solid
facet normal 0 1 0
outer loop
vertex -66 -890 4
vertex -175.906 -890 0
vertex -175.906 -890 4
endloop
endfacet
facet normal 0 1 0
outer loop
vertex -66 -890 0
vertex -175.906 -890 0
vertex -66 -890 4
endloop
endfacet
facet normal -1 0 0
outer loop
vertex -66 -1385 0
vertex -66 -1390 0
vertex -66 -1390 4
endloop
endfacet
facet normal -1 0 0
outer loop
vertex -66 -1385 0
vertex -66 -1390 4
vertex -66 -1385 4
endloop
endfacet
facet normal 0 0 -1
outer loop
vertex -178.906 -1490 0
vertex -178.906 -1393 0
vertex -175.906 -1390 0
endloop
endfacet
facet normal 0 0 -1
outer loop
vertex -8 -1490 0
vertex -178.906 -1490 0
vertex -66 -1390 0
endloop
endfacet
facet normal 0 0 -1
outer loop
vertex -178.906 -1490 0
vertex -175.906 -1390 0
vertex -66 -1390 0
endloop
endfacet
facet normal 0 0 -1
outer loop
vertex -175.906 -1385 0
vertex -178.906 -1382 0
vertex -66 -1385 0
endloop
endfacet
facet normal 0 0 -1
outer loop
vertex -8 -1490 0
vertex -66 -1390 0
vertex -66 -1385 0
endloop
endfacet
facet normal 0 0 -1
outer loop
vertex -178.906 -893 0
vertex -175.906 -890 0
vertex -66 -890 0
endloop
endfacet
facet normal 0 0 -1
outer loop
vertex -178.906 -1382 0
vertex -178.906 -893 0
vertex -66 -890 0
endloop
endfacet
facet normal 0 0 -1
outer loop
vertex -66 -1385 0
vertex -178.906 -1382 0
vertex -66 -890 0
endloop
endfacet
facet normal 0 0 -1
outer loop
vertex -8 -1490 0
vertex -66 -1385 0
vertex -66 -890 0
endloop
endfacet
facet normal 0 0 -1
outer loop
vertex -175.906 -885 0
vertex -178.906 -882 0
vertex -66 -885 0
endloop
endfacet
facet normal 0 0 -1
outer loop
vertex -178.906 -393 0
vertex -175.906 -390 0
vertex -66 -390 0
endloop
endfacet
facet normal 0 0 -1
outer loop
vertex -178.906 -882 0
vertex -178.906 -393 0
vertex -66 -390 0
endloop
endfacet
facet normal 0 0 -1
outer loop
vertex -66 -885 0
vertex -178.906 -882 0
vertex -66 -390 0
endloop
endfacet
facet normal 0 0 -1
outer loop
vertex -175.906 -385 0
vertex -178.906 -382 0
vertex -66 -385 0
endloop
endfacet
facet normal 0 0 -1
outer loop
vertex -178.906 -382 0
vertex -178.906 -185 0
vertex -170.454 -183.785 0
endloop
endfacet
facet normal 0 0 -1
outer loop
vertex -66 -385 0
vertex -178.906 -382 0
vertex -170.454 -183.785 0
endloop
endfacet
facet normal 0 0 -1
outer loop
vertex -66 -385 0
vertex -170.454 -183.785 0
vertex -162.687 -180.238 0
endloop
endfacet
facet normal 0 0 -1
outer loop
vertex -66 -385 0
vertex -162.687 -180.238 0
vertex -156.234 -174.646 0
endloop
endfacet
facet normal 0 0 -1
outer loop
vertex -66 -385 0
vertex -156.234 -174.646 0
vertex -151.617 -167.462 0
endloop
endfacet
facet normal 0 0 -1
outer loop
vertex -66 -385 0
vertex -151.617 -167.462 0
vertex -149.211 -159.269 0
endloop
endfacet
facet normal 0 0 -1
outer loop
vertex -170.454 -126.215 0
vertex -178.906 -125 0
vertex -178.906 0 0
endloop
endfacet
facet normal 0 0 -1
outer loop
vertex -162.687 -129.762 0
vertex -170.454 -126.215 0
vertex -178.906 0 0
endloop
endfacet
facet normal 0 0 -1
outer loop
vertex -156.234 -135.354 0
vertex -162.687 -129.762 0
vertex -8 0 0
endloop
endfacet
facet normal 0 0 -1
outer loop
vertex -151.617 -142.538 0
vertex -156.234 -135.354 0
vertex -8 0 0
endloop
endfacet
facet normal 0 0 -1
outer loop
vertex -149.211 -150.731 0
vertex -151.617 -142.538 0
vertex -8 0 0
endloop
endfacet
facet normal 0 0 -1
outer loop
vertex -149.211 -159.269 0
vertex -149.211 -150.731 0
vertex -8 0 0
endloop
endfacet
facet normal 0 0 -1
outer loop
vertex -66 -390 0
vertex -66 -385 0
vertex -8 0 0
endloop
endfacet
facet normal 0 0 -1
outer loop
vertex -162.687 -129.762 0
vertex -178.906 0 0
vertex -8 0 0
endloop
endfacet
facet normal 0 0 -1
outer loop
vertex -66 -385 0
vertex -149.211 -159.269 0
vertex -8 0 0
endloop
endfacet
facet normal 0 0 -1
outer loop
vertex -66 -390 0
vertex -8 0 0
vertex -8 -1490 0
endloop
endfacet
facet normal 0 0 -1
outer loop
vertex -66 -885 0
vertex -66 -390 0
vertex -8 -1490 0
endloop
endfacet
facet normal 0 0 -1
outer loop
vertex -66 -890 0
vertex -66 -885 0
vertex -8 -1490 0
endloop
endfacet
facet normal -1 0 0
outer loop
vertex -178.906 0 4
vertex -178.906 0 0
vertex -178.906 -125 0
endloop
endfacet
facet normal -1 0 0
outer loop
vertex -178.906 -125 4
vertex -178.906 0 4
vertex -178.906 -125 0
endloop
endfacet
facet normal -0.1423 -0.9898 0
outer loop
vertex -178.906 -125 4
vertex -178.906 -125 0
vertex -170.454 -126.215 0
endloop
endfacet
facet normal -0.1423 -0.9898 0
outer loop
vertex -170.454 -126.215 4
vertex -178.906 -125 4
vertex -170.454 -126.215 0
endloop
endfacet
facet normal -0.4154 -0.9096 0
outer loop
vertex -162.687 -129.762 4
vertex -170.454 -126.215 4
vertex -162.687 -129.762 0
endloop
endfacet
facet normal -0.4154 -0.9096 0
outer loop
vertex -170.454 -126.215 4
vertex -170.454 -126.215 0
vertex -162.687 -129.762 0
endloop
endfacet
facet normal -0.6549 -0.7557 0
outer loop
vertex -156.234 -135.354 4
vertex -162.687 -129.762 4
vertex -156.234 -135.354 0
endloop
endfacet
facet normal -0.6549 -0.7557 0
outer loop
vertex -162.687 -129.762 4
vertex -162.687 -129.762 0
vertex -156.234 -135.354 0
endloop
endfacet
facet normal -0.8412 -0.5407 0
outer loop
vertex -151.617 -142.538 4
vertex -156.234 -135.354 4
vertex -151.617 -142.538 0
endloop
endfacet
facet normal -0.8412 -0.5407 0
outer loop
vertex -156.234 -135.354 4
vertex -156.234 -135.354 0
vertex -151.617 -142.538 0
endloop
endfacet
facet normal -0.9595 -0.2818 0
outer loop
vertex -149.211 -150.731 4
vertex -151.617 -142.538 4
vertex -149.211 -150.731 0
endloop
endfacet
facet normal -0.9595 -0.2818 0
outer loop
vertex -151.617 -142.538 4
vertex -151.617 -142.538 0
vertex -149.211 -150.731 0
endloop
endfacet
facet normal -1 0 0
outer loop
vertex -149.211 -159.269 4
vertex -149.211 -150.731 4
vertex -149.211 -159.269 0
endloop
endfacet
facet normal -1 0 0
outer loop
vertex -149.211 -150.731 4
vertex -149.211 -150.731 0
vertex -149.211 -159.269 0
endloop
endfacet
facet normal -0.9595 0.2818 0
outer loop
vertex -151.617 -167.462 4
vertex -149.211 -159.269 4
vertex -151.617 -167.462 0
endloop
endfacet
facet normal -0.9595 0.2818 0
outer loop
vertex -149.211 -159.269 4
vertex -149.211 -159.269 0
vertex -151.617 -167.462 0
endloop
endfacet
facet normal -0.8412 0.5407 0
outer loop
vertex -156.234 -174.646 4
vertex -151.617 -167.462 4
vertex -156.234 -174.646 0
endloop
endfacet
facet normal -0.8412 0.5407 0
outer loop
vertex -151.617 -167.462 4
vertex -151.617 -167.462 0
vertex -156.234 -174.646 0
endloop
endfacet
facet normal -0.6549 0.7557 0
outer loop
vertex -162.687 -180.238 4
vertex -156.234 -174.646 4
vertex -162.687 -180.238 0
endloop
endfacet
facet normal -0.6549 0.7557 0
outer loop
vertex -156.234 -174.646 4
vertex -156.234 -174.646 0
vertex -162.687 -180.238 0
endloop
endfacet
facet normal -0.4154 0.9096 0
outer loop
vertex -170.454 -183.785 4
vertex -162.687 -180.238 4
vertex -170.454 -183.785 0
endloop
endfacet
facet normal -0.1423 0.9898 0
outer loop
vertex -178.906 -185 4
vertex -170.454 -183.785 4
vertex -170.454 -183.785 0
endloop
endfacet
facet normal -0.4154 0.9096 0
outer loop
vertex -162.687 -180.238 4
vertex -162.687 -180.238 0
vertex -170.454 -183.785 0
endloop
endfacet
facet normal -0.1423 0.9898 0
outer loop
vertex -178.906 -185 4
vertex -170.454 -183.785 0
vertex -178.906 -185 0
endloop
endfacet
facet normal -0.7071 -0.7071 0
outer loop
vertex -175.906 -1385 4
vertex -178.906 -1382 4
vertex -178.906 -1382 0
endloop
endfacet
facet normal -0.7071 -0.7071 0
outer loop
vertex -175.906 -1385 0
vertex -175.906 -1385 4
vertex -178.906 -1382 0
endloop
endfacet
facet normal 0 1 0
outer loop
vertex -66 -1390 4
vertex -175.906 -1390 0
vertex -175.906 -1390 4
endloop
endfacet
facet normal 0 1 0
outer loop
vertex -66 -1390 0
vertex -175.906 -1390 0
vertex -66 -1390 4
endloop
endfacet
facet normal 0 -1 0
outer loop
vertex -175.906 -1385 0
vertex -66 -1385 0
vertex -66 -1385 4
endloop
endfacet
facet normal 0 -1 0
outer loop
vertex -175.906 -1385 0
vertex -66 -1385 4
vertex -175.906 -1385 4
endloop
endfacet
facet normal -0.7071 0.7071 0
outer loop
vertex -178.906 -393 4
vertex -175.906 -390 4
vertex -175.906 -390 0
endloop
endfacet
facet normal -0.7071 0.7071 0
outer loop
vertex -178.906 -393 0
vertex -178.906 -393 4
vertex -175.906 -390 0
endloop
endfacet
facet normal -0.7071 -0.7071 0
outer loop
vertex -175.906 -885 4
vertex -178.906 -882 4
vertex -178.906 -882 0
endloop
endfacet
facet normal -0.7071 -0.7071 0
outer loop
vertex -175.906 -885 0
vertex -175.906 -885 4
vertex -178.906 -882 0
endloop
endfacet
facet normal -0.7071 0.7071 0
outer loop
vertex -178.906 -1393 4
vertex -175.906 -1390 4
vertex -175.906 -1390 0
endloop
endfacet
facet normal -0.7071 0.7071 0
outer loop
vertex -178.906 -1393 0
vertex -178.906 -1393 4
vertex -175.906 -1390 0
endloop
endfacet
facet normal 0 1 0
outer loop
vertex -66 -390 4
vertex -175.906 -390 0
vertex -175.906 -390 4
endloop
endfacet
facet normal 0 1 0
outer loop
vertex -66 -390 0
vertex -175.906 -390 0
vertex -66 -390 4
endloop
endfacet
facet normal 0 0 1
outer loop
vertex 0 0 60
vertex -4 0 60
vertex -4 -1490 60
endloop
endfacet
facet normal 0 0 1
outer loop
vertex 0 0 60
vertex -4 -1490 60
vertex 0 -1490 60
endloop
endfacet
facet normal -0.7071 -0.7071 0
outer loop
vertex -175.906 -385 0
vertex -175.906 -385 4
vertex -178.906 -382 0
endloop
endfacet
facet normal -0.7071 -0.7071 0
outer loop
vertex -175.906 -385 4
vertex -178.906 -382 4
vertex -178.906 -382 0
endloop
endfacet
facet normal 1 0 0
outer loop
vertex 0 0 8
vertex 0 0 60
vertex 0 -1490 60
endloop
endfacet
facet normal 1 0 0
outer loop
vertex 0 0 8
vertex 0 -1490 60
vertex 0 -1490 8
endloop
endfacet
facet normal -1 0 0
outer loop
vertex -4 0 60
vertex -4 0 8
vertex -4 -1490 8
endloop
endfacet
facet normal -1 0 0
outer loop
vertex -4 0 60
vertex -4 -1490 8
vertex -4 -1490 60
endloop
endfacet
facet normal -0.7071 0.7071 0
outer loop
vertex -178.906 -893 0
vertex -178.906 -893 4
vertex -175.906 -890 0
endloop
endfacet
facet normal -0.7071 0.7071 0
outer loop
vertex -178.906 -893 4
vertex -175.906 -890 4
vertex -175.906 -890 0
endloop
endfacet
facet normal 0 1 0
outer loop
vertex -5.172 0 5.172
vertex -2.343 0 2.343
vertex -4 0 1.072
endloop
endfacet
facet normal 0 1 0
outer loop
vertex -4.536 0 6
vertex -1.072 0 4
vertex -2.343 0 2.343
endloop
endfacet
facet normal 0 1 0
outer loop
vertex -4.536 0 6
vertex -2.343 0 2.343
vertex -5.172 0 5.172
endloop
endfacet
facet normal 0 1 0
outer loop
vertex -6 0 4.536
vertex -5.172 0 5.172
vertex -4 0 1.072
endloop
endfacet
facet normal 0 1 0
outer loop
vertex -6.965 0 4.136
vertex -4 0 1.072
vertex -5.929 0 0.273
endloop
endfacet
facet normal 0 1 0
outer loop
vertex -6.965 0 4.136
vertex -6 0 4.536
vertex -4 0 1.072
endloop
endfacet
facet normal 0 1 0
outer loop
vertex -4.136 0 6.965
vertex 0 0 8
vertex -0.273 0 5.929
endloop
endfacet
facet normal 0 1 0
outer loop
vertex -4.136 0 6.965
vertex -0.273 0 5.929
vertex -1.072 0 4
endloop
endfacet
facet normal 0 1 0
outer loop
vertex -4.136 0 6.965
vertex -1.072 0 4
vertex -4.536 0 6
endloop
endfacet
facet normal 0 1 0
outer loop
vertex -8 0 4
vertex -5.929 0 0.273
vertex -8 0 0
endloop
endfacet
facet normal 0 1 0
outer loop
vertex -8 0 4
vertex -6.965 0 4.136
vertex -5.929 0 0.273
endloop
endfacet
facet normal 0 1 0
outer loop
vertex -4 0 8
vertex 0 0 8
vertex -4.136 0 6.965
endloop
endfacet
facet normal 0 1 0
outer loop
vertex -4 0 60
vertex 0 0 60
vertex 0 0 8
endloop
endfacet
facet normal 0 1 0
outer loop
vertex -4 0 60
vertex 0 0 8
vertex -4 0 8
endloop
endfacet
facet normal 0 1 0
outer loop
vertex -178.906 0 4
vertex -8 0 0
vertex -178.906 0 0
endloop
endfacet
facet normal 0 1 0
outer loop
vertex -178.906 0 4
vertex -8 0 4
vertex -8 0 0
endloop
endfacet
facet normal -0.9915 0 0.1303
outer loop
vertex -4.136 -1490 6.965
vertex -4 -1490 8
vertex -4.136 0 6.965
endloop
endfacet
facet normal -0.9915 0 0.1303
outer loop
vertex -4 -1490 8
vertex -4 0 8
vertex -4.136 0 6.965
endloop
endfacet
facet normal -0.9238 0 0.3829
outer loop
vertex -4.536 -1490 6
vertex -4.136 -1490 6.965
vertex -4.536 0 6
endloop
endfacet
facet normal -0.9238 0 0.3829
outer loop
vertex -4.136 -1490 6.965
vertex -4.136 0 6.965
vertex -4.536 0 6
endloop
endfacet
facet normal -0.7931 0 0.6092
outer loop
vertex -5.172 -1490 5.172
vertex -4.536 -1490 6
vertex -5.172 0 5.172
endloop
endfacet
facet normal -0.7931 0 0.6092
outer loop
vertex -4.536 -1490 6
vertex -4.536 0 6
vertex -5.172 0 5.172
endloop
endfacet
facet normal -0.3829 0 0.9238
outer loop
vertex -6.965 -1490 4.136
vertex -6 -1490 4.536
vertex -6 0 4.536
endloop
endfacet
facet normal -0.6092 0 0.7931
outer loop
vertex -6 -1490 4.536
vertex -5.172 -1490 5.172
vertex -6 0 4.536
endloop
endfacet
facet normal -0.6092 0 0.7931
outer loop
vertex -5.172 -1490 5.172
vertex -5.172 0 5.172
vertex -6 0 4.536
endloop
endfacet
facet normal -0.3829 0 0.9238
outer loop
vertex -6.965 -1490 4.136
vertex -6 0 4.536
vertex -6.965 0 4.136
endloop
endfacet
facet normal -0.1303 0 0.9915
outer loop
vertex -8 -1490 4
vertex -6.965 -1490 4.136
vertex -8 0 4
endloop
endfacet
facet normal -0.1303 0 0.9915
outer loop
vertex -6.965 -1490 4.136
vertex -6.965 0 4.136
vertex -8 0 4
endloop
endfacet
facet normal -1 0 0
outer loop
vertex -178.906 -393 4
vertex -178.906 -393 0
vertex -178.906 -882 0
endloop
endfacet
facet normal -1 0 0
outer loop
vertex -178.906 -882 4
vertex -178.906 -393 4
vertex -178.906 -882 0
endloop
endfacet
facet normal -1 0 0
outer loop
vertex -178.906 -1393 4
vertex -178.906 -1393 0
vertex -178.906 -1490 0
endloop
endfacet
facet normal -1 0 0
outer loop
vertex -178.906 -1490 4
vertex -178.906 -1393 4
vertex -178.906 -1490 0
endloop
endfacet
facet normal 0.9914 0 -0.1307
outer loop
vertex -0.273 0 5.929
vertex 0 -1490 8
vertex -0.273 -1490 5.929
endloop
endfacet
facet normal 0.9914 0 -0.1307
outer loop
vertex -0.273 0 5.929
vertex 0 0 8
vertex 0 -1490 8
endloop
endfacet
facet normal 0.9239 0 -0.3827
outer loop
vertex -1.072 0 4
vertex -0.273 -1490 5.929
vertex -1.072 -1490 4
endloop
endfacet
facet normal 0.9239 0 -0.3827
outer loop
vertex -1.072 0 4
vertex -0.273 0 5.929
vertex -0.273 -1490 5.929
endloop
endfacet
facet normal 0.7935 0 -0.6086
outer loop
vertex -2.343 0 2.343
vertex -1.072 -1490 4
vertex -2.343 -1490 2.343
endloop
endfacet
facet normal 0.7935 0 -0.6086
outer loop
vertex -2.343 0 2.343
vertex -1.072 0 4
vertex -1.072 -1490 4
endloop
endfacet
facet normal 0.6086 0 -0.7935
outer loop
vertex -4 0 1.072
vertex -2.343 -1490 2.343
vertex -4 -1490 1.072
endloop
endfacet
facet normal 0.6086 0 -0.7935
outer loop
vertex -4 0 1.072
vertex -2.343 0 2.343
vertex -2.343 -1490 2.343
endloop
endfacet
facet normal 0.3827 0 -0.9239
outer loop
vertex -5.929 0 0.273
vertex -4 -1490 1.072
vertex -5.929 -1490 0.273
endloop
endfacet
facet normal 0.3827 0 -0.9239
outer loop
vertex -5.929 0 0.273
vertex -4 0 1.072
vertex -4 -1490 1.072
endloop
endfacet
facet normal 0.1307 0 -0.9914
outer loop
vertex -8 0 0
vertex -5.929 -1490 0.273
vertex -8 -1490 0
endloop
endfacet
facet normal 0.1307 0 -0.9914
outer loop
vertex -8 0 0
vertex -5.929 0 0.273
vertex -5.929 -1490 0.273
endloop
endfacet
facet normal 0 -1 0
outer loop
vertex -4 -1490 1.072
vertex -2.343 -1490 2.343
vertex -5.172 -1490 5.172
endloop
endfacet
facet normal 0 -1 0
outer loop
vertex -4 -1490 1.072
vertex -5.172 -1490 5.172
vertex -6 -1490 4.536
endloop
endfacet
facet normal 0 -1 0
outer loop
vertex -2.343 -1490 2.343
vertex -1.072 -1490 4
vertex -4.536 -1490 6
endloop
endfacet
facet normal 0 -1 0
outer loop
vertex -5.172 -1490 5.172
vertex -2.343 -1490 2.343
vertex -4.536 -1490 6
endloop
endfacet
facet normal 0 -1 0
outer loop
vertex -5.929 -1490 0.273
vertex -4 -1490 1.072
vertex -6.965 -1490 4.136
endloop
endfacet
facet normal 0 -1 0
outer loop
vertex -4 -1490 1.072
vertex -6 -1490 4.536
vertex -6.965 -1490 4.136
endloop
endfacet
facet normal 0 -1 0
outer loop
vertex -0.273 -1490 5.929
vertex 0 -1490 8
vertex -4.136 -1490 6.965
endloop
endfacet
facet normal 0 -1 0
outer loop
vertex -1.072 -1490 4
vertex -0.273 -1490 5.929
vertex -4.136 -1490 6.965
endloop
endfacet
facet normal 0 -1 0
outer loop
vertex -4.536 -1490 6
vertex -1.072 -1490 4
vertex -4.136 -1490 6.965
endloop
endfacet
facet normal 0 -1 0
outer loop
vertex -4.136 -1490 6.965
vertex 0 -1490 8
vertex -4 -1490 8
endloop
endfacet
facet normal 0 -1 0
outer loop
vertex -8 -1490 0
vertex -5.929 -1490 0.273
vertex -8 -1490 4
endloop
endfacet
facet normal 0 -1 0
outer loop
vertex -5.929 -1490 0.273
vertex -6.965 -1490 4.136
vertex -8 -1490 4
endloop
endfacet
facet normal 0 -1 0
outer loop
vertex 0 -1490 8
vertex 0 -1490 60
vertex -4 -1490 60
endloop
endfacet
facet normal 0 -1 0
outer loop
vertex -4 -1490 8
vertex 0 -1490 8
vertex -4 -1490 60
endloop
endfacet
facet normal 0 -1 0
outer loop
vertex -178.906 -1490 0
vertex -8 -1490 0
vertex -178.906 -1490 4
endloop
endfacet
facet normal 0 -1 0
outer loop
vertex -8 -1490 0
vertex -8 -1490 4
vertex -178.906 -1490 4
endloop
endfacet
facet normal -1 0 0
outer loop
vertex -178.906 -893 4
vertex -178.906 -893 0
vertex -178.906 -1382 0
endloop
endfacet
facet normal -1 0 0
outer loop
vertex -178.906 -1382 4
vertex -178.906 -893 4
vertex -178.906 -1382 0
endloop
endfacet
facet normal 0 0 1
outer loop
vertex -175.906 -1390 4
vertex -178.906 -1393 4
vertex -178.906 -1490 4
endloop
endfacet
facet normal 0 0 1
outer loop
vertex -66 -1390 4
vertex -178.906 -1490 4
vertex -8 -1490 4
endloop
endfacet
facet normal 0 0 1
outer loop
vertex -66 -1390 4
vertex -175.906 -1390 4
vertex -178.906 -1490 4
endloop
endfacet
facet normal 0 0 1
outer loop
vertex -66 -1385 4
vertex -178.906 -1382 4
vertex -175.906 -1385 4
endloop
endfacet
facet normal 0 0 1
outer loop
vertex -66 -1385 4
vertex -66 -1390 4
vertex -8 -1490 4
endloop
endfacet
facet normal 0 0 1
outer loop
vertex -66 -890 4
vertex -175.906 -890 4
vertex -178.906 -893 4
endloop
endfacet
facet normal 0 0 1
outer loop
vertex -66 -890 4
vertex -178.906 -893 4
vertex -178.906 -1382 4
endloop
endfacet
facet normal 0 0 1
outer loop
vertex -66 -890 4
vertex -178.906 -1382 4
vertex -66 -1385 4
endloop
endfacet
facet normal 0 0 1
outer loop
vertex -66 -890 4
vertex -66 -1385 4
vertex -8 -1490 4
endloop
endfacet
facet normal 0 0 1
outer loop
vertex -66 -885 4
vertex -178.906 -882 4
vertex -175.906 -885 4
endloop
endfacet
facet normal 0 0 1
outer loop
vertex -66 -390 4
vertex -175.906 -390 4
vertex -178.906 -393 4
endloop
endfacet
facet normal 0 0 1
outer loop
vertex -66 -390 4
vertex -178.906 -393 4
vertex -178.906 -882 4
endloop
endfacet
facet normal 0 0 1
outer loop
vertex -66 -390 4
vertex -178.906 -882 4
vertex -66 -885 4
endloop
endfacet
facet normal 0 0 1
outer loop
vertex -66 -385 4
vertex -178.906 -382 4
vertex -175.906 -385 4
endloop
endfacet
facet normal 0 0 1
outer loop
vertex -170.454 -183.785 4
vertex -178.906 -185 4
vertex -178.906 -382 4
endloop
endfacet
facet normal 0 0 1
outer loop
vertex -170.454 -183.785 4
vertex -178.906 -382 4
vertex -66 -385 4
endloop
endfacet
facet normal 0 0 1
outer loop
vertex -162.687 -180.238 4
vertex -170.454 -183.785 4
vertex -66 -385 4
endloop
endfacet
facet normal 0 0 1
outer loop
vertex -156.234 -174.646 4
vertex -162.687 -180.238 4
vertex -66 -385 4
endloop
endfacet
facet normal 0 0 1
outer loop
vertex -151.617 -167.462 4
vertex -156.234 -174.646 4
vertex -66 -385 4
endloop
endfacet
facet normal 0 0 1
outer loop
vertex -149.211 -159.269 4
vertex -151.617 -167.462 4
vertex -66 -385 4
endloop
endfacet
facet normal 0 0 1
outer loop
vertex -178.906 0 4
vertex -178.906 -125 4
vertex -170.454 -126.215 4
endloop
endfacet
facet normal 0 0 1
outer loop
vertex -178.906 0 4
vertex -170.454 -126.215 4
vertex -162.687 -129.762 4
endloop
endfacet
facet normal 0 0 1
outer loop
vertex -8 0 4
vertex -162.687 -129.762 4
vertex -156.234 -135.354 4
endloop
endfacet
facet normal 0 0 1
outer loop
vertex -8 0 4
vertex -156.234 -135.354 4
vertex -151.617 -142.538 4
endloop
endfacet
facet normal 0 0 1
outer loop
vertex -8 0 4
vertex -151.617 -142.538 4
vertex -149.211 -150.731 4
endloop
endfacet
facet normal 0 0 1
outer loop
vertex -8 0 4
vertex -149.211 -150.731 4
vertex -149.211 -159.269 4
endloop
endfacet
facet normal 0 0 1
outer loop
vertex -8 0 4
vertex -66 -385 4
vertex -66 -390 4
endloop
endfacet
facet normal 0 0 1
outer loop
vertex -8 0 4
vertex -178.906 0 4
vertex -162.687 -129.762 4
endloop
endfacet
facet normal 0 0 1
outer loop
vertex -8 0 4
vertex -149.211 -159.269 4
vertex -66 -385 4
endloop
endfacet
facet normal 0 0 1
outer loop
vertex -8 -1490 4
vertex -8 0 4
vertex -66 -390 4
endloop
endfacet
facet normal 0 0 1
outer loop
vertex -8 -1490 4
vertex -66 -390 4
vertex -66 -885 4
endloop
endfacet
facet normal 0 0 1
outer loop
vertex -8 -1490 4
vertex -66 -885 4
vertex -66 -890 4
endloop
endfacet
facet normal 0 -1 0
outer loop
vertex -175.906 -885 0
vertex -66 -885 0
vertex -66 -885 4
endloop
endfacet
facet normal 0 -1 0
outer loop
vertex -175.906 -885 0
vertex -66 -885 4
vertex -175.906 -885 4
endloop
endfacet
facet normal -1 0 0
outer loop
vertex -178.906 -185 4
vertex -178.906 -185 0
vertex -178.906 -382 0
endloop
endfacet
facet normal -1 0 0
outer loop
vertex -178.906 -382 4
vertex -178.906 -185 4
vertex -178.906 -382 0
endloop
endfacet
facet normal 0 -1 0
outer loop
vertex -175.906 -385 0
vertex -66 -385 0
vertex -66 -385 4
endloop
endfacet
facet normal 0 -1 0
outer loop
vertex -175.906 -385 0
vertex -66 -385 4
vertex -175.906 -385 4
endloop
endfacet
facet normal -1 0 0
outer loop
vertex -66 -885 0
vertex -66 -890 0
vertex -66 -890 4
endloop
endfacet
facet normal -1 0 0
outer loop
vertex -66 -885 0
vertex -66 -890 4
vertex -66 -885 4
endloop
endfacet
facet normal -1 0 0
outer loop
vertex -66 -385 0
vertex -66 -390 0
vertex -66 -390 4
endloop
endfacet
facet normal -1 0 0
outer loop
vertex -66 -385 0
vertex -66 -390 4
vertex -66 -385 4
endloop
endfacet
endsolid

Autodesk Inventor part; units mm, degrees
ref_plane "YZ Plane" through (0, 0, 0) normal (1, 0, 0) x (0, 1, 0)
ref_plane "XZ Plane" through (0, 0, 0) normal (0, 1, 0) x (-1, 0, 0)
ref_plane "XY Plane" through (0, 0, 0) normal (0, 0, 1) x (1, 0, 0)
sketch "Sketch1" plane through (0, 0, 0) normal (0, 0, 1) x (1, 0, 0)
  line L0 (0, 0) -> (-178.9061, 0)
  line L1 (-178.9061, 0) -> (-178.9061, -1490)
  line L2 (-178.9061, -1490) -> (0, -1490)
  line L3 (0, -1490) -> (0, 0)
  line L4 (-178.9061, -1390) -> (-66, -1390)
  line L5 (-66, -1390) -> (-66, -1385)
  line L6 (-66, -1385) -> (-178.9061, -1385)
  line L7 (-178.9061, -1385) -> (-178.9061, -1390)
  line L8 (-178.9061, -890) -> (-66, -890)
  line L9 (-66, -890) -> (-66, -885)
  line L10 (-66, -885) -> (-178.9061, -885)
  line L11 (-178.9061, -885) -> (-178.9061, -890)
  line L12 (-178.9061, -390) -> (-66, -390)
  line L13 (-66, -390) -> (-66, -385)
  line L14 (-66, -385) -> (-178.9061, -385)
  line L15 (-178.9061, -385) -> (-178.9061, -390)
  circle A0 centre (-178.9061, -155) radius 30
  point P0 (-178.9061, -390)
  point P1 (-178.9061, -885)
  point P2 (-178.9061, -125)
  point P3 (-178.9061, -185)
  dimension "d0" = 1490
  dimension "d1" = 178.9061
  dimension "d2" = 5
  dimension "d4" = 100
  dimension "d7" = 500
  dimension "d23" = 66
  dimension "d28" = 60
  dimension "d30" = 1335
extrude "Plate1" add sketch "Sketch1" along normal blind 4 contours L3 L2 L1 L4 L5 L6 L8 L9 L10 L12 L13 L14 A0 L0
sketch "Sketch2" plane through (-4, 0, 0) normal (1, 0, 0) x (0, 1, 0)
  line L0 (-1490, 0) -> (0, 0)
  line L1 (0, 0) -> (0, 60)
  line L2 (0, 60) -> (-1490, 60)
  line L3 (-1490, 60) -> (-1490, 0)
edge flange "Flange1" height 60 angle 90 thickness 4 bend radius 4 thickness toward (1, 0, 0) relief tear relief width 4 relief depth 2 edges at (0, -745, 4) wall of the first edge with corners at (-4, -1490, 0) (-4, 0, 0) (-4, 0, 60) (-4, -1490, 60)
bend "Bend1"
corner "Corner1"
chamfer "Corner Chamfer1" distance 3 angle 45 6 edges at (-178.9061, -1390, 2) (-178.9061, -1385, 2) (-178.9061, -890, 2) (-178.9061, -885, 2) (-178.9061, -385, 2) (-178.9061, -390, 2)
equation "\"d0\" = Стрингер_длина"
equation "\"d1\" = стрингер_глубина_2"
equation "\"d2\" = паз_под_стрингер_толщина"
equation "\"d23\" = паз_под_стрингер_глубина - Thickness"
equation "\"d28\" = 2 * радиус_выреза_под_сварку"
equation "\"d12\" = Thickness"
equation "\"d13\" = BendReliefWidth"
equation "\"d14\" = BendReliefDepth"
equation "\"d15\" = MinimumRemnant"
equation "\"d16\" = TransitionRadius"
equation "\"d17\" = ребро_усилителей"
equation "\"d19\" = BendRadius"
equation "\"d20\" = CornerReliefSize"
equation "\"d21\" = GapSize"
equation "\"d22\" = JacobiRadiusSize"
equation "\"BendRadius\" = Thickness"
equation "\"BendReliefWidth\" = Thickness"
equation "\"BendReliefDepth\" = 0.5 * Thickness"
equation "\"CornerReliefSize\" = 4 * Thickness"
equation "\"MinimumRemnant\" = 2 * Thickness"
equation "\"TransitionRadius\" = BendRadius"
equation "\"JacobiRadiusSize\" = BendRadius"
equation "\"GapSize\" = Thickness"
equation "\"Стрингер_длина\" = 1490"
equation "\"стрингер_глубина_2\" = 178.906141"
equation "\"паз_под_стрингер_толщина\" = 5"
equation "\"паз_под_стрингер_глубина\" = 70"
equation "\"Thickness\" = 4"
equation "\"радиус_выреза_под_сварку\" = 30"
equation "\"ребро_усилителей\" = 60"
properties part number "0235 GBK stringer 2" material "Steel"
